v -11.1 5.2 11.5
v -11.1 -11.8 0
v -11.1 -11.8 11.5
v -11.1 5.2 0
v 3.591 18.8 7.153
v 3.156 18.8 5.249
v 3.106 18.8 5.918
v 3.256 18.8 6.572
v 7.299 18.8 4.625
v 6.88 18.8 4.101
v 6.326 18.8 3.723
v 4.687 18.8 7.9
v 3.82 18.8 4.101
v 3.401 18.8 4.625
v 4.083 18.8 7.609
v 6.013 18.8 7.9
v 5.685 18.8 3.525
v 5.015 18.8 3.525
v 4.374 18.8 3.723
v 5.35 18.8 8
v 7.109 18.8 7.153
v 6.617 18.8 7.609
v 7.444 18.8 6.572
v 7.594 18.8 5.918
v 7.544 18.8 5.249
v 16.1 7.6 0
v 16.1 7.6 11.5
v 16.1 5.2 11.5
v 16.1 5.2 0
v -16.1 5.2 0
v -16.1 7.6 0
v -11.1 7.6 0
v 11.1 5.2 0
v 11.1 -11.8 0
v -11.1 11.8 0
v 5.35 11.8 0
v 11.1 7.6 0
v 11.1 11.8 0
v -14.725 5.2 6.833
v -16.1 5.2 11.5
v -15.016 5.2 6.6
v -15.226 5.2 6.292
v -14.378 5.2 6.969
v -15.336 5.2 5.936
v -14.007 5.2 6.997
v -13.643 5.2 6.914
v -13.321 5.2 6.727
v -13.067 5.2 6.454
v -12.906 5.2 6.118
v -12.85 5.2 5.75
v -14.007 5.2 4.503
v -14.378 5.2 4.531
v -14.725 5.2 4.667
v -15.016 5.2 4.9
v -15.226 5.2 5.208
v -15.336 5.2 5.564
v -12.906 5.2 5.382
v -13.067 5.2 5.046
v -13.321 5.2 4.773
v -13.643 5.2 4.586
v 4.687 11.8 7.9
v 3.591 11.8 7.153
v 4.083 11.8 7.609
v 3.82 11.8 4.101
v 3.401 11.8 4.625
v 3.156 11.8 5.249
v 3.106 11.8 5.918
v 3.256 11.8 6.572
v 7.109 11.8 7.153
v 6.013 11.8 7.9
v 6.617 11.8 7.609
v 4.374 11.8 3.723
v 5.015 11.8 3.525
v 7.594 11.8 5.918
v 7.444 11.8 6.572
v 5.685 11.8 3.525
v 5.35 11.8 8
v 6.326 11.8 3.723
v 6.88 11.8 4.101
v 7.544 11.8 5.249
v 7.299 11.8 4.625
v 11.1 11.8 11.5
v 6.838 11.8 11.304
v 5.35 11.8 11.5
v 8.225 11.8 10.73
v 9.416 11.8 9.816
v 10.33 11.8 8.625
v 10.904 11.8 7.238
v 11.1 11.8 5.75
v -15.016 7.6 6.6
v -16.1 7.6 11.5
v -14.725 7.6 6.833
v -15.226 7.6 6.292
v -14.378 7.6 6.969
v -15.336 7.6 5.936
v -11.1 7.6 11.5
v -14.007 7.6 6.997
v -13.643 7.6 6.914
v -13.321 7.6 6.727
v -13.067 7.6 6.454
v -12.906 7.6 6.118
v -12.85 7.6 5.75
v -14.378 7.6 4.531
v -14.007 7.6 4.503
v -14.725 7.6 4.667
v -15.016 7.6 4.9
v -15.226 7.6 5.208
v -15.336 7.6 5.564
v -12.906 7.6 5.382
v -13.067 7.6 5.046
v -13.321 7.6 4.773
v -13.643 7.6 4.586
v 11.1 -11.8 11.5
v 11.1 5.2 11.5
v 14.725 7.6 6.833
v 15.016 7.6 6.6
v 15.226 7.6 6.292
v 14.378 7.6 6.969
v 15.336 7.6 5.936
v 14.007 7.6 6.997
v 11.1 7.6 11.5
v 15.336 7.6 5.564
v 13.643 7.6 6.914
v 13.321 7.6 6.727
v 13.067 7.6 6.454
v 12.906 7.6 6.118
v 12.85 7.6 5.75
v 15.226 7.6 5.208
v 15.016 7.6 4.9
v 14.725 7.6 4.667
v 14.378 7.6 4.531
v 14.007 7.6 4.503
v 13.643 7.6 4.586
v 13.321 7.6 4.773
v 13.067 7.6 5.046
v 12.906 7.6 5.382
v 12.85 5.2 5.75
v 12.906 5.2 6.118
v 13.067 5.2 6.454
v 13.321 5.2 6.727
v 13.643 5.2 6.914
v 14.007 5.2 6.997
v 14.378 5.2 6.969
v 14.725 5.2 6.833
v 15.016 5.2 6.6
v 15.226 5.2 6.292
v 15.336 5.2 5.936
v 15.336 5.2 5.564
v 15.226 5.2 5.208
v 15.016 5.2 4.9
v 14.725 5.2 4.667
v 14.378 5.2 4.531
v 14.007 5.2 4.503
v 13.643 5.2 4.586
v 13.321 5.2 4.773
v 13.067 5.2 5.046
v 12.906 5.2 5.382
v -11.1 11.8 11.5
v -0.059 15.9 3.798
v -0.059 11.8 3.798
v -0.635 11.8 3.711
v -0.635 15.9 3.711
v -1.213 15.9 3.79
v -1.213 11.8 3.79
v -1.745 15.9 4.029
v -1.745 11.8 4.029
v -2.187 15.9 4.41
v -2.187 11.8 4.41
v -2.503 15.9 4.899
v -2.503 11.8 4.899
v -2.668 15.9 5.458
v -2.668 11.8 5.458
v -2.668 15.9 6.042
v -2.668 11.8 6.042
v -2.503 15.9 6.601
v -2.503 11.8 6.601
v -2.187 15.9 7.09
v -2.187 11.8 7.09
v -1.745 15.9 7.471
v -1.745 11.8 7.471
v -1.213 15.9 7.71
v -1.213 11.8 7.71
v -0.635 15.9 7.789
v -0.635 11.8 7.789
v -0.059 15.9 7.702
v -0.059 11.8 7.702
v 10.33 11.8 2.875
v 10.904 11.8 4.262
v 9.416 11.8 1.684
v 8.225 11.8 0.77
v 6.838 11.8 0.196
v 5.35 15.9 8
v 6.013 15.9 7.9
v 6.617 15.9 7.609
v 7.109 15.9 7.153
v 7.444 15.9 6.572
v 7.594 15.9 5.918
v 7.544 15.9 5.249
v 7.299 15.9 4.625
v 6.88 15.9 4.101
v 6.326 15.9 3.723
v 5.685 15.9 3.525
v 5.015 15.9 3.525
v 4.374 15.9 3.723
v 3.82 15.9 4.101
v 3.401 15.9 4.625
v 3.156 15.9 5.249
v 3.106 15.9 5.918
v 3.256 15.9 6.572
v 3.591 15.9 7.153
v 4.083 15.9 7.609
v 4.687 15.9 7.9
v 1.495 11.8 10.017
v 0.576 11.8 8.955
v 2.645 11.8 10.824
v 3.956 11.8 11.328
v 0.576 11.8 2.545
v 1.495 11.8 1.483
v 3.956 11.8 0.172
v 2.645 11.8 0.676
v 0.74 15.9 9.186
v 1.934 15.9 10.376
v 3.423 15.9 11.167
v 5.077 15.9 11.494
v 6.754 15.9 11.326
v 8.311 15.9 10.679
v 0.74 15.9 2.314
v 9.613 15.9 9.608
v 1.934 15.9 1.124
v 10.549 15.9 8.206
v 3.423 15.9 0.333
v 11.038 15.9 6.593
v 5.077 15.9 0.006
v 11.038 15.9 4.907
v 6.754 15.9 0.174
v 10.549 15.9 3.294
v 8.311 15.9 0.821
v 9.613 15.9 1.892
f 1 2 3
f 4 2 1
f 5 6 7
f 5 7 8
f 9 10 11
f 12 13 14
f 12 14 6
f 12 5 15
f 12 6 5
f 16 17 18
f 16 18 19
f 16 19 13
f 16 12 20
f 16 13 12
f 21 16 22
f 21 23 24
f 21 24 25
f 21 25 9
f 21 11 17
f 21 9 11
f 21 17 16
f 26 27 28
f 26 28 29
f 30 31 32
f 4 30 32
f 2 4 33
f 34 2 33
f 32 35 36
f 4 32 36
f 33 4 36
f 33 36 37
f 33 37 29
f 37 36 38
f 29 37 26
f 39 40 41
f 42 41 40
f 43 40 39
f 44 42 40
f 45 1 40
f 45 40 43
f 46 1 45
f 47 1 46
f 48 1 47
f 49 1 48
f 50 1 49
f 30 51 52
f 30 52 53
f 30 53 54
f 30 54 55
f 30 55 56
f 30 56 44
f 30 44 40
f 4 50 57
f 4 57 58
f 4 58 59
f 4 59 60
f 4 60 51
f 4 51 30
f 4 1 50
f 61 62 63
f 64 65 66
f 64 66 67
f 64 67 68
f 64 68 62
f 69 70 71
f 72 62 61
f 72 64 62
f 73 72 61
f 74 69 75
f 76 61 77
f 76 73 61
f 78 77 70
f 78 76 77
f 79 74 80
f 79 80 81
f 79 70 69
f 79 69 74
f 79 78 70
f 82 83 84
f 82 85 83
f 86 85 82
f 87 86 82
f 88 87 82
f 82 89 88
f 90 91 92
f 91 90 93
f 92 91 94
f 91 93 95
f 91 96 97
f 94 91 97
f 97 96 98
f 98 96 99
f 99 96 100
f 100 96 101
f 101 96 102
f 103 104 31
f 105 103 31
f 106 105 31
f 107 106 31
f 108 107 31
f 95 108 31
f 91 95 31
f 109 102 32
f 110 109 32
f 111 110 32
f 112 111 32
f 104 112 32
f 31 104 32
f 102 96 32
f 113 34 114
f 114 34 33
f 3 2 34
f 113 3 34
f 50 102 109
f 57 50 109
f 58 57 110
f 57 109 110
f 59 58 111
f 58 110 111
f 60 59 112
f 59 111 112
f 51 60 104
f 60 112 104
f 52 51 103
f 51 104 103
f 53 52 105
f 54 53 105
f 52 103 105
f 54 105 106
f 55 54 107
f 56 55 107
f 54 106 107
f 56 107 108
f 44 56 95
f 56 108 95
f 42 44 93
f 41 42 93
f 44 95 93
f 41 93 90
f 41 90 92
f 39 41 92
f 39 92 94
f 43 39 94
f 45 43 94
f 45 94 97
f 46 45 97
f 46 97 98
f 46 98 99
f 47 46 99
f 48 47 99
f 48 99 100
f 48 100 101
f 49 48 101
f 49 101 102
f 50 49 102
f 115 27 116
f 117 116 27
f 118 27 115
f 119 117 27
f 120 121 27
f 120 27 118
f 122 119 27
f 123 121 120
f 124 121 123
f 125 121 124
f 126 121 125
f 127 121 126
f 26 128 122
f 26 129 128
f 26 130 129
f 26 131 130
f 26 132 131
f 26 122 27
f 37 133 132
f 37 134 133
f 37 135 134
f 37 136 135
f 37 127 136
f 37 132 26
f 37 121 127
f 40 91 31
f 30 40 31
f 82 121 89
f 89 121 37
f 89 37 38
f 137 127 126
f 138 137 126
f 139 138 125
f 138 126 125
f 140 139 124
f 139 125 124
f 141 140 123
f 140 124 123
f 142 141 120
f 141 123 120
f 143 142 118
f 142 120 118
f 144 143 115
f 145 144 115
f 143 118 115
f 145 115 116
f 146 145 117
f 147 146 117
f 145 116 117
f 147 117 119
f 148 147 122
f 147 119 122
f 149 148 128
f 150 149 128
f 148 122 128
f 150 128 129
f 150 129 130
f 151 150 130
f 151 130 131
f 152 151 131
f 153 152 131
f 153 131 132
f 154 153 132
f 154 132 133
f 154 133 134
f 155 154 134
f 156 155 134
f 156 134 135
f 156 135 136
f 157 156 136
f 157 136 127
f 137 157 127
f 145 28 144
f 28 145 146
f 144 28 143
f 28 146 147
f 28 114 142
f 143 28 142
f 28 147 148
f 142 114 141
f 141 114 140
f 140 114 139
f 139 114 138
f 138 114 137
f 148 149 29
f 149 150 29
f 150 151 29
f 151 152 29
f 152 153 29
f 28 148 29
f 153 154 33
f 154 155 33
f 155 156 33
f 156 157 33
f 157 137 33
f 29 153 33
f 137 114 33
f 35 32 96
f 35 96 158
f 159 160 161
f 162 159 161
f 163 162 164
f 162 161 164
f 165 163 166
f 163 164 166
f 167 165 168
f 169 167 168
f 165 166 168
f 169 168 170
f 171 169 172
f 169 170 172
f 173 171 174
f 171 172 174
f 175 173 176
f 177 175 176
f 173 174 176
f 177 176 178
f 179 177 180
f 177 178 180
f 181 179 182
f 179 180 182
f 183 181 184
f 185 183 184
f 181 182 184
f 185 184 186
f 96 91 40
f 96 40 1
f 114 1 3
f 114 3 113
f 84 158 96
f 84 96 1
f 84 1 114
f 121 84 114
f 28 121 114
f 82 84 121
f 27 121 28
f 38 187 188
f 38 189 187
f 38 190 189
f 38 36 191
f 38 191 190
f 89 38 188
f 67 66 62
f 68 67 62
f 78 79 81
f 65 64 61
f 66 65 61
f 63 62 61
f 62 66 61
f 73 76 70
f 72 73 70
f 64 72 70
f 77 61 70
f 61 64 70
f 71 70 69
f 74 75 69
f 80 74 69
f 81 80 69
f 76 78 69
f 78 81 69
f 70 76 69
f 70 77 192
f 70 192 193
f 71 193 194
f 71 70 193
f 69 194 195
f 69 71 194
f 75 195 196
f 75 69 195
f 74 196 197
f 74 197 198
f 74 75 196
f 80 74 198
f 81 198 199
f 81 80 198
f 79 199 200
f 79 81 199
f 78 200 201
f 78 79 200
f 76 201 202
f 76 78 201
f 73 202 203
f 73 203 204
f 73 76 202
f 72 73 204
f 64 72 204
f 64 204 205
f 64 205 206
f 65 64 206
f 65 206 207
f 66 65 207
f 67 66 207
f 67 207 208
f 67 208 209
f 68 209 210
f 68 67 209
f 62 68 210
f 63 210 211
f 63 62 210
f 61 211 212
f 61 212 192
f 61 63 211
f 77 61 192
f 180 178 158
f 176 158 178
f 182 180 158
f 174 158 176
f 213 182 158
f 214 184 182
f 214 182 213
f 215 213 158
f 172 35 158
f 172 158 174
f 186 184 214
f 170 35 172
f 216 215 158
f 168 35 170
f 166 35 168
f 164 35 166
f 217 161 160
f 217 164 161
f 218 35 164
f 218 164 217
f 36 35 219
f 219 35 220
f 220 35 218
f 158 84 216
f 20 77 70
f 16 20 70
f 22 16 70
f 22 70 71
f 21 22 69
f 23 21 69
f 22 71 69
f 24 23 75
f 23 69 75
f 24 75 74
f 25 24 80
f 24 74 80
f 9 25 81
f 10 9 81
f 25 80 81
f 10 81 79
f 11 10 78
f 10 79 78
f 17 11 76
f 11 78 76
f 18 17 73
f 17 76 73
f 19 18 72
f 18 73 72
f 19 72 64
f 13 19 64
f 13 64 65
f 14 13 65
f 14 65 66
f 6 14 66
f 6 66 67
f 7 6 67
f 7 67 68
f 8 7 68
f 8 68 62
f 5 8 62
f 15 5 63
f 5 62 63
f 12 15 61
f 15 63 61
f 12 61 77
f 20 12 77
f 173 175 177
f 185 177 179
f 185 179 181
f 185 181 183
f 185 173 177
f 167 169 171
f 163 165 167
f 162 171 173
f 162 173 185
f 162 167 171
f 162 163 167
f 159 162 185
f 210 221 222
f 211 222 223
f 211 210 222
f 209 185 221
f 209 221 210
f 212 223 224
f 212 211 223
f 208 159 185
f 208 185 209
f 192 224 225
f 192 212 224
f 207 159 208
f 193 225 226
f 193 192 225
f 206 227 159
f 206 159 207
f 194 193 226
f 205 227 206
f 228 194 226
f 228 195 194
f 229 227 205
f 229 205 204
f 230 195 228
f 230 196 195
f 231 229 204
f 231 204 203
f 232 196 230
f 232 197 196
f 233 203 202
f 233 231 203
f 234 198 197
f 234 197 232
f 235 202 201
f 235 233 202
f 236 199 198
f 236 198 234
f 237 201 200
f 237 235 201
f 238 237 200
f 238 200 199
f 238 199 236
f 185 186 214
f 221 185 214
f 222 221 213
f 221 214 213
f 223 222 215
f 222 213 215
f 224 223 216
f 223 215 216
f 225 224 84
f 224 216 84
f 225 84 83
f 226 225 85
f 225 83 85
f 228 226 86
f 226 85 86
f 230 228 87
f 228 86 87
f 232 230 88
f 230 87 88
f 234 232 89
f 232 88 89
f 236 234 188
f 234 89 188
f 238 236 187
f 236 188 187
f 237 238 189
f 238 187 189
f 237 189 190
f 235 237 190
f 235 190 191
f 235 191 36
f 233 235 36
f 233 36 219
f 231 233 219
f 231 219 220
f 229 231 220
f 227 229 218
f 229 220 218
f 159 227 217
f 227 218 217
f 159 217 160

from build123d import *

# Parameters (mm, degrees)
SKETCH2_W           = 22.2
SKETCH2_H           = 23.6
BOSS_EXTRUDE1_DEPTH = 11.5
SKETCH4_W           = 11.5
SKETCH4_H           = 2.4
BOSS_EXTRUDE3_DEPTH = 5
SKETCH5_R           = 1.25
CUT_EXTRUDE1_DEPTH  = 5
SKETCH7_R           = 2.25
BOSS_EXTRUDE4_DEPTH = 4.1
SKETCH7_3_R         = 2.25
BOSS_EXTRUDE5_DEPTH = 7


with BuildPart() as part:
    # Sketch2 → Boss-Extrude1 (new body)
    with BuildSketch(Plane.XY):
        Rectangle(SKETCH2_W, SKETCH2_H)
    extrude(amount=BOSS_EXTRUDE1_DEPTH)

    # Sketch4 → Boss-Extrude3 (add)
    with BuildSketch(Plane(origin=(11.1, 0, 0), x_dir=(0, 0, -1), z_dir=(1, 0, 0))):
        with Locations((-5.75, 6.4)):
            Rectangle(SKETCH4_W, SKETCH4_H)
    boss_extrude3 = extrude(amount=BOSS_EXTRUDE3_DEPTH)

    # Mirror1: Boss-Extrude3 across plane
    add(boss_extrude3.mirror(Plane(origin=(0, 0, 0), x_dir=(0, 0, 1), z_dir=(1, 0, 0))))

    # Sketch5 → Cut-Extrude1 (cut)
    with BuildSketch(Plane(origin=(0, 7.6, 0), x_dir=(1, 0, 0), z_dir=(0, 1, 0))):
        with Locations((14.1, -5.75)):
            Circle(SKETCH5_R)
        with Locations((-14.1, -5.75)):
            Circle(SKETCH5_R)
    extrude(amount=-CUT_EXTRUDE1_DEPTH, mode=Mode.SUBTRACT)

    # Sketch7 → Boss-Extrude4 (add)
    with BuildSketch(Plane(origin=(0, 11.8, 0), x_dir=(1, 0, 0), z_dir=(0, 1, 0))):
        with BuildLine():
            ThreePointArc((-0.05867355, -3.798397984), (-2.689219801, -5.75), (-0.05867355, -7.701602016))
            ThreePointArc((-0.05867355, -7.701602016), (11.1, -5.75), (-0.05867355, -3.798397984))
        make_face()
        with Locations((5.35, -5.75)):
            Circle(SKETCH7_R, mode=Mode.SUBTRACT)
    extrude(amount=BOSS_EXTRUDE4_DEPTH)


with BuildPart() as body_2:
    # Sketch7<3> → Boss-Extrude5 (new body)
    with BuildSketch(Plane(origin=(0, 11.8, 0), x_dir=(1, 0, 0), z_dir=(0, 1, 0))):
        with Locations((5.35, -5.75)):
            Circle(SKETCH7_3_R)
    extrude(amount=BOSS_EXTRUDE5_DEPTH)


solid = Compound([part.part, body_2.part])
